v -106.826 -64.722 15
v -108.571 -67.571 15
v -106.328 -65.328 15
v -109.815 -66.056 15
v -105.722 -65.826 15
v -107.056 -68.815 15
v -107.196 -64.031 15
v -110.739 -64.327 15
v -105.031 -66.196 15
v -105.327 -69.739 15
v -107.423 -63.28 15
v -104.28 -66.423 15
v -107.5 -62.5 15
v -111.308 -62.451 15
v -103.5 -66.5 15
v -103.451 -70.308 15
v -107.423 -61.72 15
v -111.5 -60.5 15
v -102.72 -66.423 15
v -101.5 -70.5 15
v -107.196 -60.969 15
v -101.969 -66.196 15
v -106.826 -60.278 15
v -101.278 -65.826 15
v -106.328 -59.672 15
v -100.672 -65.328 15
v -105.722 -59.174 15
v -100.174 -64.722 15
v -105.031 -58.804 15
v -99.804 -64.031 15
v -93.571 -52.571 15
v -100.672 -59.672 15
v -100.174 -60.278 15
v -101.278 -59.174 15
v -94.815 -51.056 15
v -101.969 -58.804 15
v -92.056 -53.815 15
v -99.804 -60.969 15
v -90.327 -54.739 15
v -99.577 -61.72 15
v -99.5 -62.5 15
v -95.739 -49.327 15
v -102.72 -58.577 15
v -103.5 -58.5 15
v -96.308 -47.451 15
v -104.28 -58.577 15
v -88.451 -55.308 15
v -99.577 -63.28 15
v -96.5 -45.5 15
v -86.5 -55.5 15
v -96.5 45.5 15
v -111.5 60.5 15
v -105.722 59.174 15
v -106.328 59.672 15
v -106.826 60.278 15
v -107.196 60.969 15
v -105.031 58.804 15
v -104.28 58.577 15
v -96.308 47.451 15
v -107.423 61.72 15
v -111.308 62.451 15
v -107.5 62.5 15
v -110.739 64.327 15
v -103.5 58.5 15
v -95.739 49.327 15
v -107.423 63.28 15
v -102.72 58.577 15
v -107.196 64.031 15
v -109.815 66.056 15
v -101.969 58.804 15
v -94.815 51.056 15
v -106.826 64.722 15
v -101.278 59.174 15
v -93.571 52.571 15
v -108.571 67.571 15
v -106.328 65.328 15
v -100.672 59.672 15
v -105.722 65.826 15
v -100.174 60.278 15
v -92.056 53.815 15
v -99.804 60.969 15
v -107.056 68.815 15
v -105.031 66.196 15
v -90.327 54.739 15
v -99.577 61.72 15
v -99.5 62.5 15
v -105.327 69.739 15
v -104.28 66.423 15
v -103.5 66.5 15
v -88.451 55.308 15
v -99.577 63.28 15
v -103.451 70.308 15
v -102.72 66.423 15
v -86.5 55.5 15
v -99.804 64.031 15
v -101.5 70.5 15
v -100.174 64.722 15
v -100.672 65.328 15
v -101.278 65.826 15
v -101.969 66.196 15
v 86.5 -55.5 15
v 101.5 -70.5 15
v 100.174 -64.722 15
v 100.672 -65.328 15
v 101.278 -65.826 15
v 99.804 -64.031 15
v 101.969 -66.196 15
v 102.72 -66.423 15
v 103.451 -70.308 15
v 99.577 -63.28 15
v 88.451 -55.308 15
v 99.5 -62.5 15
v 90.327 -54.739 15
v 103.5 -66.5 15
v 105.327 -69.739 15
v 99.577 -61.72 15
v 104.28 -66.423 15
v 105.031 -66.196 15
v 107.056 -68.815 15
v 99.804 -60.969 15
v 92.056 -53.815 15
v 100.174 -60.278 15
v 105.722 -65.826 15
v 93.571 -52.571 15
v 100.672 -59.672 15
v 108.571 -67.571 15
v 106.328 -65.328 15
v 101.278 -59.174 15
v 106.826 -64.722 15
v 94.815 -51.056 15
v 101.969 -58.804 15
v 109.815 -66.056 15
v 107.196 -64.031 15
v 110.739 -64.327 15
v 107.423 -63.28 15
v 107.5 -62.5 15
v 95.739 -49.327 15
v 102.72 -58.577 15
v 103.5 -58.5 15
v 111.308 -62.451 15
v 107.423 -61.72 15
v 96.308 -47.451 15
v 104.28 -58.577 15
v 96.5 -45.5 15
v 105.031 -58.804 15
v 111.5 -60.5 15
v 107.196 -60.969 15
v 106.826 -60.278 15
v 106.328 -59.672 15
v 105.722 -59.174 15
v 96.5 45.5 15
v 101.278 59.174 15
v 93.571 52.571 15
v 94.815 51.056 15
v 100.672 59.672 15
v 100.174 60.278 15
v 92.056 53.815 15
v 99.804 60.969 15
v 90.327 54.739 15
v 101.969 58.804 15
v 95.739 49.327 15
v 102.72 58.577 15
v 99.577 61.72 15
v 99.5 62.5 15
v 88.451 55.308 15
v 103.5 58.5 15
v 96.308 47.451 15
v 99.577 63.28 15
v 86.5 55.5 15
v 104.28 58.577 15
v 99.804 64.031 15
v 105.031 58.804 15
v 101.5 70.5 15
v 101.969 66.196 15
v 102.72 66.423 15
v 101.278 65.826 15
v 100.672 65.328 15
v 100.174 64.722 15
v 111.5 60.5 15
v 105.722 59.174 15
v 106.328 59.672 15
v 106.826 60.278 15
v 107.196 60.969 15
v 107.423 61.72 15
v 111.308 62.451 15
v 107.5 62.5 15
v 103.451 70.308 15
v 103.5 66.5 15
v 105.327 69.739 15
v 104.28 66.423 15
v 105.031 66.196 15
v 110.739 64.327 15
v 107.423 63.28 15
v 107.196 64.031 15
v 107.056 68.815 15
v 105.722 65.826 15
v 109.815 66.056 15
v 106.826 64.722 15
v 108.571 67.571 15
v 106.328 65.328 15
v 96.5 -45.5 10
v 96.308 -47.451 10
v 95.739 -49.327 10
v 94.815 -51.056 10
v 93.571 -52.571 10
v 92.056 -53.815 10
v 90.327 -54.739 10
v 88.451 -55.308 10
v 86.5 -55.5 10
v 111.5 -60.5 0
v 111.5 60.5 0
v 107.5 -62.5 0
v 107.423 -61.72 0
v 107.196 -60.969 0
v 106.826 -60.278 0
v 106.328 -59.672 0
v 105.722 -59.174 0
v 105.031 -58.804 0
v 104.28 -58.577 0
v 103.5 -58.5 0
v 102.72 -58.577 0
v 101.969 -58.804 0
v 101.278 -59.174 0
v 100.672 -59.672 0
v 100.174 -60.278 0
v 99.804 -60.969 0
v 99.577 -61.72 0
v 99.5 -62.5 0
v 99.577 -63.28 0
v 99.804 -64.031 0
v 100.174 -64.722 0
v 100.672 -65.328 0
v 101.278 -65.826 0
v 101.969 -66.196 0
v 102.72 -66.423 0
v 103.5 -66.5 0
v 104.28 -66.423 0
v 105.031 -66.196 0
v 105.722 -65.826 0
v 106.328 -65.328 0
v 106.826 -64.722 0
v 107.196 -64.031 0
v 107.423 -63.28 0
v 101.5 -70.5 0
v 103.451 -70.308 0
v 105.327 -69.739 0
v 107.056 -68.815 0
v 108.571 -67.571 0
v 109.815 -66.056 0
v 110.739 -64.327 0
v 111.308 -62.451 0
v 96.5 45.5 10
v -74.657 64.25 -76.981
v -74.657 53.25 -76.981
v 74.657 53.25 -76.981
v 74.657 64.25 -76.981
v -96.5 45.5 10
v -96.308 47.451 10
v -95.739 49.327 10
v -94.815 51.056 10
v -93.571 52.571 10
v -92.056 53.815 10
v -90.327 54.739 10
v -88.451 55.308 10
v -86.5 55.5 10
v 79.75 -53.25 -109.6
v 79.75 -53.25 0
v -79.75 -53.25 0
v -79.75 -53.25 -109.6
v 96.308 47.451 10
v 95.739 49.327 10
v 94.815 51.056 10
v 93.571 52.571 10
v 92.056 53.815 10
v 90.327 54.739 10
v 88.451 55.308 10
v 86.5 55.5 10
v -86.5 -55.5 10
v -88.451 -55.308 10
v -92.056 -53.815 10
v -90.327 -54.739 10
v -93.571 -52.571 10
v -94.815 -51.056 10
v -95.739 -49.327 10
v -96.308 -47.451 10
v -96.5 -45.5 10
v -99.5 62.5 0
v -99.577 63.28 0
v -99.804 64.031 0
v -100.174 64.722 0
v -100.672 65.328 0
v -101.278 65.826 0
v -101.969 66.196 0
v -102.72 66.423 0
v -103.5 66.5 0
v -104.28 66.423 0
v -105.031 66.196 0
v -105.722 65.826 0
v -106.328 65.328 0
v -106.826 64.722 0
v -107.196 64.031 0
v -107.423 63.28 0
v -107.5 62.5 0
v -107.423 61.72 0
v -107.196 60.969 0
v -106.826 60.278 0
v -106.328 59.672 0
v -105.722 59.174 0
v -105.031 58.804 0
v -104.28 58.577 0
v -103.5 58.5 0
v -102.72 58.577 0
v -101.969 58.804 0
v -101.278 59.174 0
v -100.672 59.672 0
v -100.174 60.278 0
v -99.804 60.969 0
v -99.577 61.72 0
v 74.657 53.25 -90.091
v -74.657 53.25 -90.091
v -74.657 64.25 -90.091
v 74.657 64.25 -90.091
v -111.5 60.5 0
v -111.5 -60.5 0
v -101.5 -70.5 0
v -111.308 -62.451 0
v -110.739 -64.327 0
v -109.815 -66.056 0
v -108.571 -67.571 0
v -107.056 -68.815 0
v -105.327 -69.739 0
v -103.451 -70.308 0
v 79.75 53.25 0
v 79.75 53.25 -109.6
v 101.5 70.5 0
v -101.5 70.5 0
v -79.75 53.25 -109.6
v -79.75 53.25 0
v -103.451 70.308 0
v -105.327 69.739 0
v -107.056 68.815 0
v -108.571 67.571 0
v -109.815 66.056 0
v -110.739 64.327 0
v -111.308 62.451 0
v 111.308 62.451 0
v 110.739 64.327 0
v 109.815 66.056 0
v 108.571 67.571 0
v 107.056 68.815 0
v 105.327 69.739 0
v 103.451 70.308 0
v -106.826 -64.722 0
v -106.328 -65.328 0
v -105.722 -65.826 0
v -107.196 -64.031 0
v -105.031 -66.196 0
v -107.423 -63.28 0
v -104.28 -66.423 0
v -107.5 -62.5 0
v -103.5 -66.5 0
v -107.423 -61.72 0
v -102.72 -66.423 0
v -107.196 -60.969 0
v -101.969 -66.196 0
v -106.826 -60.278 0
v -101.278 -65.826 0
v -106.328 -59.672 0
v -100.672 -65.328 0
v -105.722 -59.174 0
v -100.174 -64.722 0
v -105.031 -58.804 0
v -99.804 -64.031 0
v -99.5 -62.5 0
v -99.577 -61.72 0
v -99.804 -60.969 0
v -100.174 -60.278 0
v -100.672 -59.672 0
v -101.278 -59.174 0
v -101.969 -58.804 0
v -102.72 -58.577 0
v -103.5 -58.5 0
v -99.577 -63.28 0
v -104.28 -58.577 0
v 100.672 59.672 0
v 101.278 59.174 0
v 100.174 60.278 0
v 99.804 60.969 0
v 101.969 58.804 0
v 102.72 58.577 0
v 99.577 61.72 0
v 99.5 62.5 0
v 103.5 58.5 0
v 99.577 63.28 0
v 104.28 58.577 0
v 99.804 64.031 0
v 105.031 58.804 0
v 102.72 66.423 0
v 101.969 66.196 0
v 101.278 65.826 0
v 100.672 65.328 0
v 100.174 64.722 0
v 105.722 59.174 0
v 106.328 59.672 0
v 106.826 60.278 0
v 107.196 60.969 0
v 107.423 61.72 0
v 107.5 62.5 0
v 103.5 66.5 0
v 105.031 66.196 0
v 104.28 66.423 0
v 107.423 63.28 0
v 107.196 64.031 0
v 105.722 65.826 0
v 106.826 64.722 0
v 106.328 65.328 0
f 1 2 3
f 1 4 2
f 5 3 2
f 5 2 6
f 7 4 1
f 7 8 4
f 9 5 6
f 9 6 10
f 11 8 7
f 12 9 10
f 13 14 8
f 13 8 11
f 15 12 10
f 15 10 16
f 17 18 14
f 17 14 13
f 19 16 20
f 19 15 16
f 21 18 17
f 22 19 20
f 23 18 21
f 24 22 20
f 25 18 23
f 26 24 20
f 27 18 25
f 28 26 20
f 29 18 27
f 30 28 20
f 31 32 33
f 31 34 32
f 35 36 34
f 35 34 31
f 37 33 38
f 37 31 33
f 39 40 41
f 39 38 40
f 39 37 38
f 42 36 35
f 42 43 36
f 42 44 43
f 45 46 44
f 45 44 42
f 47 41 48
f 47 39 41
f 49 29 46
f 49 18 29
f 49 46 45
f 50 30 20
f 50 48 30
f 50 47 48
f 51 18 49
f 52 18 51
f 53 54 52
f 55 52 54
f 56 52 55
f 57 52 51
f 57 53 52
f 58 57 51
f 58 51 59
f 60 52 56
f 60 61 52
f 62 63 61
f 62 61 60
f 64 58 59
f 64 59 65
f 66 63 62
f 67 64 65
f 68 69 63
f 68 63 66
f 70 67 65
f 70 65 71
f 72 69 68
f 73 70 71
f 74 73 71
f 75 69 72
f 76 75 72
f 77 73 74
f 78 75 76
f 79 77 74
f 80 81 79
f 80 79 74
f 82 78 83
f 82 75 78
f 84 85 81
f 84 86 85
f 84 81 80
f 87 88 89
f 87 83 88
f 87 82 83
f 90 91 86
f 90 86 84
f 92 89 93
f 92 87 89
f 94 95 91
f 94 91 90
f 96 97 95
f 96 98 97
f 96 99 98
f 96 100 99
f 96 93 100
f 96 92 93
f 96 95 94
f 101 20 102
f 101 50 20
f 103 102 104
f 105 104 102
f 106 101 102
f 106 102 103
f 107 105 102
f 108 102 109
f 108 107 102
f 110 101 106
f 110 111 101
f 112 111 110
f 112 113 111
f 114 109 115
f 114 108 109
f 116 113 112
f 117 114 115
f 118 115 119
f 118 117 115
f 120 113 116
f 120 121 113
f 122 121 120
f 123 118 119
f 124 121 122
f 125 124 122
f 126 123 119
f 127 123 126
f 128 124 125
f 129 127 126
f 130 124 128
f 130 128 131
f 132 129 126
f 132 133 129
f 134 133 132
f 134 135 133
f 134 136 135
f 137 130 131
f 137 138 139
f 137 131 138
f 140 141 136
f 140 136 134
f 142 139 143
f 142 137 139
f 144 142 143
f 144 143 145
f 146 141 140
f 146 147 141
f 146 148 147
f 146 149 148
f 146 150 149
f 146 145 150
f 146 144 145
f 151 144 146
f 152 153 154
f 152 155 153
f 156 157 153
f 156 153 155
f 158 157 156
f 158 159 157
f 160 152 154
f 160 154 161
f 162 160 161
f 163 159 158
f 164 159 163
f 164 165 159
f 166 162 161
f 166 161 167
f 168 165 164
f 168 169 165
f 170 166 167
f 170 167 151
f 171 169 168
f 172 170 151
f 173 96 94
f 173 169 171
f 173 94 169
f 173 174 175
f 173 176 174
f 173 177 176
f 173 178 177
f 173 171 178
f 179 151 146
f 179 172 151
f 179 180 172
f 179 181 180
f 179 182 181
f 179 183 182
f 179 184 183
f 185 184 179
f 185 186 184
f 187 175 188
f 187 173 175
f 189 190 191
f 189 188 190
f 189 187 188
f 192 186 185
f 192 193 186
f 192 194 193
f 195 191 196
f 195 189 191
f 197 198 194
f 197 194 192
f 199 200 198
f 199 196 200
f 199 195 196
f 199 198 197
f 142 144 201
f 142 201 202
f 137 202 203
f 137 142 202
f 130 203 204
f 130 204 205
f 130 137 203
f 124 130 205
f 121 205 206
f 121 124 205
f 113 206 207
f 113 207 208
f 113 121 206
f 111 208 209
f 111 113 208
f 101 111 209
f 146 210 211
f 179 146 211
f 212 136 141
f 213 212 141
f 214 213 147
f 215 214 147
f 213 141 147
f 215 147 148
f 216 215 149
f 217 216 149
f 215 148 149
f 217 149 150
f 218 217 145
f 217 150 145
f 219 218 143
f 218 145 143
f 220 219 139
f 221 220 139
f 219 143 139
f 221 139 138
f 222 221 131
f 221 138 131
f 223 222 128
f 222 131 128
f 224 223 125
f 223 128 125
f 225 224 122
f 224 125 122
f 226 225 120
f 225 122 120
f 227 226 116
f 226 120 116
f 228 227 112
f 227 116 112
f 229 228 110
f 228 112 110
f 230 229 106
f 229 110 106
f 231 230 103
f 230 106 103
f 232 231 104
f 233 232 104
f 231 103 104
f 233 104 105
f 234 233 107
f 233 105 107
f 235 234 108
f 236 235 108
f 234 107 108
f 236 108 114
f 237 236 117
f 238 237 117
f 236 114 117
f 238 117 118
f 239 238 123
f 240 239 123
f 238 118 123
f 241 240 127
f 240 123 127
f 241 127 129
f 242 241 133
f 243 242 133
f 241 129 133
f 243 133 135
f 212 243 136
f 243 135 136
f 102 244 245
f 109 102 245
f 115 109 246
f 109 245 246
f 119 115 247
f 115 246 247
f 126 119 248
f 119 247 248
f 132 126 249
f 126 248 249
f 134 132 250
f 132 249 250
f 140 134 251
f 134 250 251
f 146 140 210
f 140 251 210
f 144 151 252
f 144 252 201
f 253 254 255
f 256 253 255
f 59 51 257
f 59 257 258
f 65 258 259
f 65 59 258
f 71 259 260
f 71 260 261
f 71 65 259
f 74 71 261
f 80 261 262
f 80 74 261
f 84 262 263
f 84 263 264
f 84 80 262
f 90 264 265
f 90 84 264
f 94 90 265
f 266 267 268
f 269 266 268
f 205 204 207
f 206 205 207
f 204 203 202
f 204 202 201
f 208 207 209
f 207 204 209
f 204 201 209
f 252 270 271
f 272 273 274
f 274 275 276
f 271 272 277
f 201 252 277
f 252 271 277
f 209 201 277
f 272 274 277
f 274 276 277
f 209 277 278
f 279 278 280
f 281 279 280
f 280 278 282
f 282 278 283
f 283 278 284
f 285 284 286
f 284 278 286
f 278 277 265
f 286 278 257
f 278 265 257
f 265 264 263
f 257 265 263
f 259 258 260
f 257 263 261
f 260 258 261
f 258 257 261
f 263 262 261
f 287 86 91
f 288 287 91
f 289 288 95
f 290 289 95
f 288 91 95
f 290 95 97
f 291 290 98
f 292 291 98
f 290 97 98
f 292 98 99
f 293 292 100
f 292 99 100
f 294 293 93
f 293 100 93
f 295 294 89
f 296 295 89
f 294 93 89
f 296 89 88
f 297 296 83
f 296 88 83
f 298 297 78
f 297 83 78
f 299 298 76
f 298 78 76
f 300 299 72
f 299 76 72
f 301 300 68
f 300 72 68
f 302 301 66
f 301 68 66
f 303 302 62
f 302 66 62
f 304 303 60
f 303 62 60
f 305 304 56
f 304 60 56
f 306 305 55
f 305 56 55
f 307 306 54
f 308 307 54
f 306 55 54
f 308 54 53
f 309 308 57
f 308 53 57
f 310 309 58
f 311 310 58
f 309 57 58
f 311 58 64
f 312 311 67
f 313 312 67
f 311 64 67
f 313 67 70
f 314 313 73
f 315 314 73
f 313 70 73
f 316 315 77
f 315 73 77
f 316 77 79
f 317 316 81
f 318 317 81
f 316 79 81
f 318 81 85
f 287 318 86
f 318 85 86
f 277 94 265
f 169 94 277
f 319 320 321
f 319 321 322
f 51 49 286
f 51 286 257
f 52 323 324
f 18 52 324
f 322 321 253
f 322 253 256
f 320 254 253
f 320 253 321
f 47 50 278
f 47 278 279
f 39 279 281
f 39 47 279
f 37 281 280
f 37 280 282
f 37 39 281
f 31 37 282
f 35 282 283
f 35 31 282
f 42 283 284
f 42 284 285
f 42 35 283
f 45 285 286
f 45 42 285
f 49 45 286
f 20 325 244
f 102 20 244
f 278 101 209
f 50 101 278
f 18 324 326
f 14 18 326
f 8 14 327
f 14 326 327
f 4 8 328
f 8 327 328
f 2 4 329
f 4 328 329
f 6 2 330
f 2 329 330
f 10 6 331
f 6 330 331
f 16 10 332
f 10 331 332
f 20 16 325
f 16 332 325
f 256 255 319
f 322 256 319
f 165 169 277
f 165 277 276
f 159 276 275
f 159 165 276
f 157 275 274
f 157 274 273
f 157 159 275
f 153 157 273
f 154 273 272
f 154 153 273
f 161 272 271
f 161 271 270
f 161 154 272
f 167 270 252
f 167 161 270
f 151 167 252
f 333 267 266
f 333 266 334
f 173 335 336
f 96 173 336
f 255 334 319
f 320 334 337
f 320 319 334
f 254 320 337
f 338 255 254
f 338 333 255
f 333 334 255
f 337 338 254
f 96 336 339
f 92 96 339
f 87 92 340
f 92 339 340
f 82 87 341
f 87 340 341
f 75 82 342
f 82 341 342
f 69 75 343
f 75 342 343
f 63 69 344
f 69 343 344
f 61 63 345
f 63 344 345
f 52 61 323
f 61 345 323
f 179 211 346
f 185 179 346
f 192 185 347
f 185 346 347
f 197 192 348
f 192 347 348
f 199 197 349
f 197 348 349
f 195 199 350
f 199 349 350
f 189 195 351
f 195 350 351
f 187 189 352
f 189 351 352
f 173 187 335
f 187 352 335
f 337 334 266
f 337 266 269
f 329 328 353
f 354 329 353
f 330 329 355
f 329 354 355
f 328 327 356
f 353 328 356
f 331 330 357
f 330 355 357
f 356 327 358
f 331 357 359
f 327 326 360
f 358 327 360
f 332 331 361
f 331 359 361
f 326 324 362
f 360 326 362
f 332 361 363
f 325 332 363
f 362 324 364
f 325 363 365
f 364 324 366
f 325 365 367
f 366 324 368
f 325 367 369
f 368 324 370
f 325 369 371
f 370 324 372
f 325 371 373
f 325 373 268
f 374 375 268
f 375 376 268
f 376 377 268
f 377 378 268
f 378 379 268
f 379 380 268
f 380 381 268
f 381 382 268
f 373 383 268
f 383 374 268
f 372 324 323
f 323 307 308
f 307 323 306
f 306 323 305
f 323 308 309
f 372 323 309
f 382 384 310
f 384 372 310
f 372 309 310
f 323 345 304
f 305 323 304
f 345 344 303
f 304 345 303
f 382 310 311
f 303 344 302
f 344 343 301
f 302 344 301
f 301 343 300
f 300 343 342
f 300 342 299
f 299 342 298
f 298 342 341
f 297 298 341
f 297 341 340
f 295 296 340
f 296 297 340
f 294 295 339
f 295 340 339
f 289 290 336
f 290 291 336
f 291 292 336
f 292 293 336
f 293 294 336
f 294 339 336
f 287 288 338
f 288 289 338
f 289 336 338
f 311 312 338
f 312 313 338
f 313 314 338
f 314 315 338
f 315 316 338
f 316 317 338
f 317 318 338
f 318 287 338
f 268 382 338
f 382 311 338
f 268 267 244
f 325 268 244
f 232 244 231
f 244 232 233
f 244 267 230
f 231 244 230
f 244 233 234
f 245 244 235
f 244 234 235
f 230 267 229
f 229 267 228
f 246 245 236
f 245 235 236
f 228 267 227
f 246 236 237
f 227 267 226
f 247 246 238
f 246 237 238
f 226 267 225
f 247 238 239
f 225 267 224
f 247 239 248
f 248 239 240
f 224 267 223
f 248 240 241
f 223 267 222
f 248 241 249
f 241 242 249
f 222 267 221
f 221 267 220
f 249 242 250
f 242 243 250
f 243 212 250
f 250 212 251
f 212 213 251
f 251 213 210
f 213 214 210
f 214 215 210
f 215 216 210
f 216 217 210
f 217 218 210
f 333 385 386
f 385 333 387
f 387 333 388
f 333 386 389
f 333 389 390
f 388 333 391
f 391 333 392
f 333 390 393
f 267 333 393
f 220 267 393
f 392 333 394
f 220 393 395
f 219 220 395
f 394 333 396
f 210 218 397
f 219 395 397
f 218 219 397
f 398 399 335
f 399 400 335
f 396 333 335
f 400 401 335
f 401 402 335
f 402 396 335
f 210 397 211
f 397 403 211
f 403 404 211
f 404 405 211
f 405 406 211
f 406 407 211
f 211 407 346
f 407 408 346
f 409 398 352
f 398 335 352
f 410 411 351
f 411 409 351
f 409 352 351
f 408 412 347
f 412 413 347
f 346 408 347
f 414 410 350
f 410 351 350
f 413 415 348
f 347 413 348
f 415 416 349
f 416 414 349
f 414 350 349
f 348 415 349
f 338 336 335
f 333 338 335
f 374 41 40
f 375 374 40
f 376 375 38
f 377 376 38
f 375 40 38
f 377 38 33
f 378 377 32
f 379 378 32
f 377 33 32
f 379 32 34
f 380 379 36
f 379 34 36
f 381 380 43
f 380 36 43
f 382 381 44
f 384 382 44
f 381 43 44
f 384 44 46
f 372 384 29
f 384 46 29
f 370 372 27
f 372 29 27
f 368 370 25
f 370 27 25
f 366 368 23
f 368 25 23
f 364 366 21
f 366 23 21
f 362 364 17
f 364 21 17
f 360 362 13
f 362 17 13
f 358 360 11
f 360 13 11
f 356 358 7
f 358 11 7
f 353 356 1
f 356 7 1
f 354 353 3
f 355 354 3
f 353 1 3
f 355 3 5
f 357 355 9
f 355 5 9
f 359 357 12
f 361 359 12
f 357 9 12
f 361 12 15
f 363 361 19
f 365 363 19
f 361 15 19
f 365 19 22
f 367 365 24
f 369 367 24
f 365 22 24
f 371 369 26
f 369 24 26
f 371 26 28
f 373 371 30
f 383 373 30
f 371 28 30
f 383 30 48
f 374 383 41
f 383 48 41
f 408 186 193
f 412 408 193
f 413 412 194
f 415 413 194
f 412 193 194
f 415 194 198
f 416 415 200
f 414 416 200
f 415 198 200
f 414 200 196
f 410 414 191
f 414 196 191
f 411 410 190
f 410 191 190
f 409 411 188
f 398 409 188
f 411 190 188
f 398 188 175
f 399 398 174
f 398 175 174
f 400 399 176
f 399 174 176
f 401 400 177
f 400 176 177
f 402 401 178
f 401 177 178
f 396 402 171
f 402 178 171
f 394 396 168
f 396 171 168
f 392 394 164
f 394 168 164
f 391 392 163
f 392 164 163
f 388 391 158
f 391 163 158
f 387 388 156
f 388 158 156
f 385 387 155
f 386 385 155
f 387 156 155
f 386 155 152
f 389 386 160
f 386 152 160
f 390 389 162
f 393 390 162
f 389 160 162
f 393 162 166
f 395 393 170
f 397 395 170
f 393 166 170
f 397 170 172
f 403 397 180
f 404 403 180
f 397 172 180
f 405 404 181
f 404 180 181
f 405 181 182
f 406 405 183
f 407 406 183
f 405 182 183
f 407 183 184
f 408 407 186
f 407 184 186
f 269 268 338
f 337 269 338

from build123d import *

# Parameters (mm, degrees)
SALIENTE_EXTRUIR1_DEPTH = 15
CROQUIS2_W              = 159.5
CROQUIS2_H              = 106.5
SALIENTE_EXTRUIR2_DEPTH = 109.6
CORTAR_EXTRUIR1_DEPTH   = 5
CROQUIS4_R              = 4
CORTAR_EXTRUIR2_DEPTH   = 15
CROQUIS5_W              = 149.31449295
CROQUIS5_H              = 13.110540845
SALIENTE_EXTRUIR3_DEPTH = 11


with BuildPart() as part:
    # Croquis1 → Saliente-Extruir1 (new body)
    with BuildSketch(Plane.XY):
        with BuildLine():
            Line((-101.5, -70.5), (101.5, -70.5))
            ThreePointArc((101.5, -70.5), (108.571067812, -67.571067812), (111.5, -60.5))
            Line((111.5, -60.5), (111.5, 60.5))
            ThreePointArc((111.5, 60.5), (108.571067812, 67.571067812), (101.5, 70.5))
            Line((101.5, 70.5), (-101.5, 70.5))
            ThreePointArc((-101.5, 70.5), (-108.571067812, 67.571067812), (-111.5, 60.5))
            Line((-111.5, 60.5), (-111.5, -60.5))
            ThreePointArc((-111.5, -60.5), (-108.571067812, -67.571067812), (-101.5, -70.5))
        make_face()
    extrude(amount=SALIENTE_EXTRUIR1_DEPTH)

    # Croquis2 → Saliente-Extruir2 (add)
    with BuildSketch(Plane(origin=(0, 0, 0), x_dir=(-1, 0, 0), z_dir=(0, 0, -1))):
        Rectangle(CROQUIS2_W, CROQUIS2_H)
    extrude(amount=SALIENTE_EXTRUIR2_DEPTH)

    # Croquis3 → Cortar-Extruir1 (cut)
    with BuildSketch(Plane.XY.offset(15)):
        with BuildLine():
            Line((86.5, -55.5), (-86.5, -55.5))
            ThreePointArc((-86.5, -55.5), (-93.571067812, -52.571067812), (-96.5, -45.5))
            Line((-96.5, -45.5), (-96.5, 45.5))
            ThreePointArc((-96.5, 45.5), (-93.571067812, 52.571067812), (-86.5, 55.5))
            Line((-86.5, 55.5), (86.5, 55.5))
            ThreePointArc((86.5, 55.5), (93.571067812, 52.571067812), (96.5, 45.5))
            Line((96.5, 45.5), (96.5, -45.5))
            ThreePointArc((96.5, -45.5), (93.571067812, -52.571067812), (86.5, -55.5))
        make_face()
    extrude(amount=-CORTAR_EXTRUIR1_DEPTH, mode=Mode.SUBTRACT)

    # Croquis4 → Cortar-Extruir2 (cut)
    with BuildSketch(Plane.XY.offset(15)):
        with Locations((-103.5, 62.5)):
            Circle(CROQUIS4_R)
        with Locations((103.5, 62.5)):
            Circle(CROQUIS4_R)
        with Locations((103.5, -62.5)):
            Circle(CROQUIS4_R)
        with Locations((-103.5, -62.5)):
            Circle(CROQUIS4_R)
    extrude(amount=-CORTAR_EXTRUIR2_DEPTH, mode=Mode.SUBTRACT)

    # Croquis5 → Saliente-Extruir3 (add)
    with BuildSketch(Plane(origin=(0, 53.25, 0), x_dir=(1, 0, 0), z_dir=(0, 1, 0))):
        with Locations((0, 83.536078168)):
            Rectangle(CROQUIS5_W, CROQUIS5_H)
    extrude(amount=SALIENTE_EXTRUIR3_DEPTH)


solid = part.part
